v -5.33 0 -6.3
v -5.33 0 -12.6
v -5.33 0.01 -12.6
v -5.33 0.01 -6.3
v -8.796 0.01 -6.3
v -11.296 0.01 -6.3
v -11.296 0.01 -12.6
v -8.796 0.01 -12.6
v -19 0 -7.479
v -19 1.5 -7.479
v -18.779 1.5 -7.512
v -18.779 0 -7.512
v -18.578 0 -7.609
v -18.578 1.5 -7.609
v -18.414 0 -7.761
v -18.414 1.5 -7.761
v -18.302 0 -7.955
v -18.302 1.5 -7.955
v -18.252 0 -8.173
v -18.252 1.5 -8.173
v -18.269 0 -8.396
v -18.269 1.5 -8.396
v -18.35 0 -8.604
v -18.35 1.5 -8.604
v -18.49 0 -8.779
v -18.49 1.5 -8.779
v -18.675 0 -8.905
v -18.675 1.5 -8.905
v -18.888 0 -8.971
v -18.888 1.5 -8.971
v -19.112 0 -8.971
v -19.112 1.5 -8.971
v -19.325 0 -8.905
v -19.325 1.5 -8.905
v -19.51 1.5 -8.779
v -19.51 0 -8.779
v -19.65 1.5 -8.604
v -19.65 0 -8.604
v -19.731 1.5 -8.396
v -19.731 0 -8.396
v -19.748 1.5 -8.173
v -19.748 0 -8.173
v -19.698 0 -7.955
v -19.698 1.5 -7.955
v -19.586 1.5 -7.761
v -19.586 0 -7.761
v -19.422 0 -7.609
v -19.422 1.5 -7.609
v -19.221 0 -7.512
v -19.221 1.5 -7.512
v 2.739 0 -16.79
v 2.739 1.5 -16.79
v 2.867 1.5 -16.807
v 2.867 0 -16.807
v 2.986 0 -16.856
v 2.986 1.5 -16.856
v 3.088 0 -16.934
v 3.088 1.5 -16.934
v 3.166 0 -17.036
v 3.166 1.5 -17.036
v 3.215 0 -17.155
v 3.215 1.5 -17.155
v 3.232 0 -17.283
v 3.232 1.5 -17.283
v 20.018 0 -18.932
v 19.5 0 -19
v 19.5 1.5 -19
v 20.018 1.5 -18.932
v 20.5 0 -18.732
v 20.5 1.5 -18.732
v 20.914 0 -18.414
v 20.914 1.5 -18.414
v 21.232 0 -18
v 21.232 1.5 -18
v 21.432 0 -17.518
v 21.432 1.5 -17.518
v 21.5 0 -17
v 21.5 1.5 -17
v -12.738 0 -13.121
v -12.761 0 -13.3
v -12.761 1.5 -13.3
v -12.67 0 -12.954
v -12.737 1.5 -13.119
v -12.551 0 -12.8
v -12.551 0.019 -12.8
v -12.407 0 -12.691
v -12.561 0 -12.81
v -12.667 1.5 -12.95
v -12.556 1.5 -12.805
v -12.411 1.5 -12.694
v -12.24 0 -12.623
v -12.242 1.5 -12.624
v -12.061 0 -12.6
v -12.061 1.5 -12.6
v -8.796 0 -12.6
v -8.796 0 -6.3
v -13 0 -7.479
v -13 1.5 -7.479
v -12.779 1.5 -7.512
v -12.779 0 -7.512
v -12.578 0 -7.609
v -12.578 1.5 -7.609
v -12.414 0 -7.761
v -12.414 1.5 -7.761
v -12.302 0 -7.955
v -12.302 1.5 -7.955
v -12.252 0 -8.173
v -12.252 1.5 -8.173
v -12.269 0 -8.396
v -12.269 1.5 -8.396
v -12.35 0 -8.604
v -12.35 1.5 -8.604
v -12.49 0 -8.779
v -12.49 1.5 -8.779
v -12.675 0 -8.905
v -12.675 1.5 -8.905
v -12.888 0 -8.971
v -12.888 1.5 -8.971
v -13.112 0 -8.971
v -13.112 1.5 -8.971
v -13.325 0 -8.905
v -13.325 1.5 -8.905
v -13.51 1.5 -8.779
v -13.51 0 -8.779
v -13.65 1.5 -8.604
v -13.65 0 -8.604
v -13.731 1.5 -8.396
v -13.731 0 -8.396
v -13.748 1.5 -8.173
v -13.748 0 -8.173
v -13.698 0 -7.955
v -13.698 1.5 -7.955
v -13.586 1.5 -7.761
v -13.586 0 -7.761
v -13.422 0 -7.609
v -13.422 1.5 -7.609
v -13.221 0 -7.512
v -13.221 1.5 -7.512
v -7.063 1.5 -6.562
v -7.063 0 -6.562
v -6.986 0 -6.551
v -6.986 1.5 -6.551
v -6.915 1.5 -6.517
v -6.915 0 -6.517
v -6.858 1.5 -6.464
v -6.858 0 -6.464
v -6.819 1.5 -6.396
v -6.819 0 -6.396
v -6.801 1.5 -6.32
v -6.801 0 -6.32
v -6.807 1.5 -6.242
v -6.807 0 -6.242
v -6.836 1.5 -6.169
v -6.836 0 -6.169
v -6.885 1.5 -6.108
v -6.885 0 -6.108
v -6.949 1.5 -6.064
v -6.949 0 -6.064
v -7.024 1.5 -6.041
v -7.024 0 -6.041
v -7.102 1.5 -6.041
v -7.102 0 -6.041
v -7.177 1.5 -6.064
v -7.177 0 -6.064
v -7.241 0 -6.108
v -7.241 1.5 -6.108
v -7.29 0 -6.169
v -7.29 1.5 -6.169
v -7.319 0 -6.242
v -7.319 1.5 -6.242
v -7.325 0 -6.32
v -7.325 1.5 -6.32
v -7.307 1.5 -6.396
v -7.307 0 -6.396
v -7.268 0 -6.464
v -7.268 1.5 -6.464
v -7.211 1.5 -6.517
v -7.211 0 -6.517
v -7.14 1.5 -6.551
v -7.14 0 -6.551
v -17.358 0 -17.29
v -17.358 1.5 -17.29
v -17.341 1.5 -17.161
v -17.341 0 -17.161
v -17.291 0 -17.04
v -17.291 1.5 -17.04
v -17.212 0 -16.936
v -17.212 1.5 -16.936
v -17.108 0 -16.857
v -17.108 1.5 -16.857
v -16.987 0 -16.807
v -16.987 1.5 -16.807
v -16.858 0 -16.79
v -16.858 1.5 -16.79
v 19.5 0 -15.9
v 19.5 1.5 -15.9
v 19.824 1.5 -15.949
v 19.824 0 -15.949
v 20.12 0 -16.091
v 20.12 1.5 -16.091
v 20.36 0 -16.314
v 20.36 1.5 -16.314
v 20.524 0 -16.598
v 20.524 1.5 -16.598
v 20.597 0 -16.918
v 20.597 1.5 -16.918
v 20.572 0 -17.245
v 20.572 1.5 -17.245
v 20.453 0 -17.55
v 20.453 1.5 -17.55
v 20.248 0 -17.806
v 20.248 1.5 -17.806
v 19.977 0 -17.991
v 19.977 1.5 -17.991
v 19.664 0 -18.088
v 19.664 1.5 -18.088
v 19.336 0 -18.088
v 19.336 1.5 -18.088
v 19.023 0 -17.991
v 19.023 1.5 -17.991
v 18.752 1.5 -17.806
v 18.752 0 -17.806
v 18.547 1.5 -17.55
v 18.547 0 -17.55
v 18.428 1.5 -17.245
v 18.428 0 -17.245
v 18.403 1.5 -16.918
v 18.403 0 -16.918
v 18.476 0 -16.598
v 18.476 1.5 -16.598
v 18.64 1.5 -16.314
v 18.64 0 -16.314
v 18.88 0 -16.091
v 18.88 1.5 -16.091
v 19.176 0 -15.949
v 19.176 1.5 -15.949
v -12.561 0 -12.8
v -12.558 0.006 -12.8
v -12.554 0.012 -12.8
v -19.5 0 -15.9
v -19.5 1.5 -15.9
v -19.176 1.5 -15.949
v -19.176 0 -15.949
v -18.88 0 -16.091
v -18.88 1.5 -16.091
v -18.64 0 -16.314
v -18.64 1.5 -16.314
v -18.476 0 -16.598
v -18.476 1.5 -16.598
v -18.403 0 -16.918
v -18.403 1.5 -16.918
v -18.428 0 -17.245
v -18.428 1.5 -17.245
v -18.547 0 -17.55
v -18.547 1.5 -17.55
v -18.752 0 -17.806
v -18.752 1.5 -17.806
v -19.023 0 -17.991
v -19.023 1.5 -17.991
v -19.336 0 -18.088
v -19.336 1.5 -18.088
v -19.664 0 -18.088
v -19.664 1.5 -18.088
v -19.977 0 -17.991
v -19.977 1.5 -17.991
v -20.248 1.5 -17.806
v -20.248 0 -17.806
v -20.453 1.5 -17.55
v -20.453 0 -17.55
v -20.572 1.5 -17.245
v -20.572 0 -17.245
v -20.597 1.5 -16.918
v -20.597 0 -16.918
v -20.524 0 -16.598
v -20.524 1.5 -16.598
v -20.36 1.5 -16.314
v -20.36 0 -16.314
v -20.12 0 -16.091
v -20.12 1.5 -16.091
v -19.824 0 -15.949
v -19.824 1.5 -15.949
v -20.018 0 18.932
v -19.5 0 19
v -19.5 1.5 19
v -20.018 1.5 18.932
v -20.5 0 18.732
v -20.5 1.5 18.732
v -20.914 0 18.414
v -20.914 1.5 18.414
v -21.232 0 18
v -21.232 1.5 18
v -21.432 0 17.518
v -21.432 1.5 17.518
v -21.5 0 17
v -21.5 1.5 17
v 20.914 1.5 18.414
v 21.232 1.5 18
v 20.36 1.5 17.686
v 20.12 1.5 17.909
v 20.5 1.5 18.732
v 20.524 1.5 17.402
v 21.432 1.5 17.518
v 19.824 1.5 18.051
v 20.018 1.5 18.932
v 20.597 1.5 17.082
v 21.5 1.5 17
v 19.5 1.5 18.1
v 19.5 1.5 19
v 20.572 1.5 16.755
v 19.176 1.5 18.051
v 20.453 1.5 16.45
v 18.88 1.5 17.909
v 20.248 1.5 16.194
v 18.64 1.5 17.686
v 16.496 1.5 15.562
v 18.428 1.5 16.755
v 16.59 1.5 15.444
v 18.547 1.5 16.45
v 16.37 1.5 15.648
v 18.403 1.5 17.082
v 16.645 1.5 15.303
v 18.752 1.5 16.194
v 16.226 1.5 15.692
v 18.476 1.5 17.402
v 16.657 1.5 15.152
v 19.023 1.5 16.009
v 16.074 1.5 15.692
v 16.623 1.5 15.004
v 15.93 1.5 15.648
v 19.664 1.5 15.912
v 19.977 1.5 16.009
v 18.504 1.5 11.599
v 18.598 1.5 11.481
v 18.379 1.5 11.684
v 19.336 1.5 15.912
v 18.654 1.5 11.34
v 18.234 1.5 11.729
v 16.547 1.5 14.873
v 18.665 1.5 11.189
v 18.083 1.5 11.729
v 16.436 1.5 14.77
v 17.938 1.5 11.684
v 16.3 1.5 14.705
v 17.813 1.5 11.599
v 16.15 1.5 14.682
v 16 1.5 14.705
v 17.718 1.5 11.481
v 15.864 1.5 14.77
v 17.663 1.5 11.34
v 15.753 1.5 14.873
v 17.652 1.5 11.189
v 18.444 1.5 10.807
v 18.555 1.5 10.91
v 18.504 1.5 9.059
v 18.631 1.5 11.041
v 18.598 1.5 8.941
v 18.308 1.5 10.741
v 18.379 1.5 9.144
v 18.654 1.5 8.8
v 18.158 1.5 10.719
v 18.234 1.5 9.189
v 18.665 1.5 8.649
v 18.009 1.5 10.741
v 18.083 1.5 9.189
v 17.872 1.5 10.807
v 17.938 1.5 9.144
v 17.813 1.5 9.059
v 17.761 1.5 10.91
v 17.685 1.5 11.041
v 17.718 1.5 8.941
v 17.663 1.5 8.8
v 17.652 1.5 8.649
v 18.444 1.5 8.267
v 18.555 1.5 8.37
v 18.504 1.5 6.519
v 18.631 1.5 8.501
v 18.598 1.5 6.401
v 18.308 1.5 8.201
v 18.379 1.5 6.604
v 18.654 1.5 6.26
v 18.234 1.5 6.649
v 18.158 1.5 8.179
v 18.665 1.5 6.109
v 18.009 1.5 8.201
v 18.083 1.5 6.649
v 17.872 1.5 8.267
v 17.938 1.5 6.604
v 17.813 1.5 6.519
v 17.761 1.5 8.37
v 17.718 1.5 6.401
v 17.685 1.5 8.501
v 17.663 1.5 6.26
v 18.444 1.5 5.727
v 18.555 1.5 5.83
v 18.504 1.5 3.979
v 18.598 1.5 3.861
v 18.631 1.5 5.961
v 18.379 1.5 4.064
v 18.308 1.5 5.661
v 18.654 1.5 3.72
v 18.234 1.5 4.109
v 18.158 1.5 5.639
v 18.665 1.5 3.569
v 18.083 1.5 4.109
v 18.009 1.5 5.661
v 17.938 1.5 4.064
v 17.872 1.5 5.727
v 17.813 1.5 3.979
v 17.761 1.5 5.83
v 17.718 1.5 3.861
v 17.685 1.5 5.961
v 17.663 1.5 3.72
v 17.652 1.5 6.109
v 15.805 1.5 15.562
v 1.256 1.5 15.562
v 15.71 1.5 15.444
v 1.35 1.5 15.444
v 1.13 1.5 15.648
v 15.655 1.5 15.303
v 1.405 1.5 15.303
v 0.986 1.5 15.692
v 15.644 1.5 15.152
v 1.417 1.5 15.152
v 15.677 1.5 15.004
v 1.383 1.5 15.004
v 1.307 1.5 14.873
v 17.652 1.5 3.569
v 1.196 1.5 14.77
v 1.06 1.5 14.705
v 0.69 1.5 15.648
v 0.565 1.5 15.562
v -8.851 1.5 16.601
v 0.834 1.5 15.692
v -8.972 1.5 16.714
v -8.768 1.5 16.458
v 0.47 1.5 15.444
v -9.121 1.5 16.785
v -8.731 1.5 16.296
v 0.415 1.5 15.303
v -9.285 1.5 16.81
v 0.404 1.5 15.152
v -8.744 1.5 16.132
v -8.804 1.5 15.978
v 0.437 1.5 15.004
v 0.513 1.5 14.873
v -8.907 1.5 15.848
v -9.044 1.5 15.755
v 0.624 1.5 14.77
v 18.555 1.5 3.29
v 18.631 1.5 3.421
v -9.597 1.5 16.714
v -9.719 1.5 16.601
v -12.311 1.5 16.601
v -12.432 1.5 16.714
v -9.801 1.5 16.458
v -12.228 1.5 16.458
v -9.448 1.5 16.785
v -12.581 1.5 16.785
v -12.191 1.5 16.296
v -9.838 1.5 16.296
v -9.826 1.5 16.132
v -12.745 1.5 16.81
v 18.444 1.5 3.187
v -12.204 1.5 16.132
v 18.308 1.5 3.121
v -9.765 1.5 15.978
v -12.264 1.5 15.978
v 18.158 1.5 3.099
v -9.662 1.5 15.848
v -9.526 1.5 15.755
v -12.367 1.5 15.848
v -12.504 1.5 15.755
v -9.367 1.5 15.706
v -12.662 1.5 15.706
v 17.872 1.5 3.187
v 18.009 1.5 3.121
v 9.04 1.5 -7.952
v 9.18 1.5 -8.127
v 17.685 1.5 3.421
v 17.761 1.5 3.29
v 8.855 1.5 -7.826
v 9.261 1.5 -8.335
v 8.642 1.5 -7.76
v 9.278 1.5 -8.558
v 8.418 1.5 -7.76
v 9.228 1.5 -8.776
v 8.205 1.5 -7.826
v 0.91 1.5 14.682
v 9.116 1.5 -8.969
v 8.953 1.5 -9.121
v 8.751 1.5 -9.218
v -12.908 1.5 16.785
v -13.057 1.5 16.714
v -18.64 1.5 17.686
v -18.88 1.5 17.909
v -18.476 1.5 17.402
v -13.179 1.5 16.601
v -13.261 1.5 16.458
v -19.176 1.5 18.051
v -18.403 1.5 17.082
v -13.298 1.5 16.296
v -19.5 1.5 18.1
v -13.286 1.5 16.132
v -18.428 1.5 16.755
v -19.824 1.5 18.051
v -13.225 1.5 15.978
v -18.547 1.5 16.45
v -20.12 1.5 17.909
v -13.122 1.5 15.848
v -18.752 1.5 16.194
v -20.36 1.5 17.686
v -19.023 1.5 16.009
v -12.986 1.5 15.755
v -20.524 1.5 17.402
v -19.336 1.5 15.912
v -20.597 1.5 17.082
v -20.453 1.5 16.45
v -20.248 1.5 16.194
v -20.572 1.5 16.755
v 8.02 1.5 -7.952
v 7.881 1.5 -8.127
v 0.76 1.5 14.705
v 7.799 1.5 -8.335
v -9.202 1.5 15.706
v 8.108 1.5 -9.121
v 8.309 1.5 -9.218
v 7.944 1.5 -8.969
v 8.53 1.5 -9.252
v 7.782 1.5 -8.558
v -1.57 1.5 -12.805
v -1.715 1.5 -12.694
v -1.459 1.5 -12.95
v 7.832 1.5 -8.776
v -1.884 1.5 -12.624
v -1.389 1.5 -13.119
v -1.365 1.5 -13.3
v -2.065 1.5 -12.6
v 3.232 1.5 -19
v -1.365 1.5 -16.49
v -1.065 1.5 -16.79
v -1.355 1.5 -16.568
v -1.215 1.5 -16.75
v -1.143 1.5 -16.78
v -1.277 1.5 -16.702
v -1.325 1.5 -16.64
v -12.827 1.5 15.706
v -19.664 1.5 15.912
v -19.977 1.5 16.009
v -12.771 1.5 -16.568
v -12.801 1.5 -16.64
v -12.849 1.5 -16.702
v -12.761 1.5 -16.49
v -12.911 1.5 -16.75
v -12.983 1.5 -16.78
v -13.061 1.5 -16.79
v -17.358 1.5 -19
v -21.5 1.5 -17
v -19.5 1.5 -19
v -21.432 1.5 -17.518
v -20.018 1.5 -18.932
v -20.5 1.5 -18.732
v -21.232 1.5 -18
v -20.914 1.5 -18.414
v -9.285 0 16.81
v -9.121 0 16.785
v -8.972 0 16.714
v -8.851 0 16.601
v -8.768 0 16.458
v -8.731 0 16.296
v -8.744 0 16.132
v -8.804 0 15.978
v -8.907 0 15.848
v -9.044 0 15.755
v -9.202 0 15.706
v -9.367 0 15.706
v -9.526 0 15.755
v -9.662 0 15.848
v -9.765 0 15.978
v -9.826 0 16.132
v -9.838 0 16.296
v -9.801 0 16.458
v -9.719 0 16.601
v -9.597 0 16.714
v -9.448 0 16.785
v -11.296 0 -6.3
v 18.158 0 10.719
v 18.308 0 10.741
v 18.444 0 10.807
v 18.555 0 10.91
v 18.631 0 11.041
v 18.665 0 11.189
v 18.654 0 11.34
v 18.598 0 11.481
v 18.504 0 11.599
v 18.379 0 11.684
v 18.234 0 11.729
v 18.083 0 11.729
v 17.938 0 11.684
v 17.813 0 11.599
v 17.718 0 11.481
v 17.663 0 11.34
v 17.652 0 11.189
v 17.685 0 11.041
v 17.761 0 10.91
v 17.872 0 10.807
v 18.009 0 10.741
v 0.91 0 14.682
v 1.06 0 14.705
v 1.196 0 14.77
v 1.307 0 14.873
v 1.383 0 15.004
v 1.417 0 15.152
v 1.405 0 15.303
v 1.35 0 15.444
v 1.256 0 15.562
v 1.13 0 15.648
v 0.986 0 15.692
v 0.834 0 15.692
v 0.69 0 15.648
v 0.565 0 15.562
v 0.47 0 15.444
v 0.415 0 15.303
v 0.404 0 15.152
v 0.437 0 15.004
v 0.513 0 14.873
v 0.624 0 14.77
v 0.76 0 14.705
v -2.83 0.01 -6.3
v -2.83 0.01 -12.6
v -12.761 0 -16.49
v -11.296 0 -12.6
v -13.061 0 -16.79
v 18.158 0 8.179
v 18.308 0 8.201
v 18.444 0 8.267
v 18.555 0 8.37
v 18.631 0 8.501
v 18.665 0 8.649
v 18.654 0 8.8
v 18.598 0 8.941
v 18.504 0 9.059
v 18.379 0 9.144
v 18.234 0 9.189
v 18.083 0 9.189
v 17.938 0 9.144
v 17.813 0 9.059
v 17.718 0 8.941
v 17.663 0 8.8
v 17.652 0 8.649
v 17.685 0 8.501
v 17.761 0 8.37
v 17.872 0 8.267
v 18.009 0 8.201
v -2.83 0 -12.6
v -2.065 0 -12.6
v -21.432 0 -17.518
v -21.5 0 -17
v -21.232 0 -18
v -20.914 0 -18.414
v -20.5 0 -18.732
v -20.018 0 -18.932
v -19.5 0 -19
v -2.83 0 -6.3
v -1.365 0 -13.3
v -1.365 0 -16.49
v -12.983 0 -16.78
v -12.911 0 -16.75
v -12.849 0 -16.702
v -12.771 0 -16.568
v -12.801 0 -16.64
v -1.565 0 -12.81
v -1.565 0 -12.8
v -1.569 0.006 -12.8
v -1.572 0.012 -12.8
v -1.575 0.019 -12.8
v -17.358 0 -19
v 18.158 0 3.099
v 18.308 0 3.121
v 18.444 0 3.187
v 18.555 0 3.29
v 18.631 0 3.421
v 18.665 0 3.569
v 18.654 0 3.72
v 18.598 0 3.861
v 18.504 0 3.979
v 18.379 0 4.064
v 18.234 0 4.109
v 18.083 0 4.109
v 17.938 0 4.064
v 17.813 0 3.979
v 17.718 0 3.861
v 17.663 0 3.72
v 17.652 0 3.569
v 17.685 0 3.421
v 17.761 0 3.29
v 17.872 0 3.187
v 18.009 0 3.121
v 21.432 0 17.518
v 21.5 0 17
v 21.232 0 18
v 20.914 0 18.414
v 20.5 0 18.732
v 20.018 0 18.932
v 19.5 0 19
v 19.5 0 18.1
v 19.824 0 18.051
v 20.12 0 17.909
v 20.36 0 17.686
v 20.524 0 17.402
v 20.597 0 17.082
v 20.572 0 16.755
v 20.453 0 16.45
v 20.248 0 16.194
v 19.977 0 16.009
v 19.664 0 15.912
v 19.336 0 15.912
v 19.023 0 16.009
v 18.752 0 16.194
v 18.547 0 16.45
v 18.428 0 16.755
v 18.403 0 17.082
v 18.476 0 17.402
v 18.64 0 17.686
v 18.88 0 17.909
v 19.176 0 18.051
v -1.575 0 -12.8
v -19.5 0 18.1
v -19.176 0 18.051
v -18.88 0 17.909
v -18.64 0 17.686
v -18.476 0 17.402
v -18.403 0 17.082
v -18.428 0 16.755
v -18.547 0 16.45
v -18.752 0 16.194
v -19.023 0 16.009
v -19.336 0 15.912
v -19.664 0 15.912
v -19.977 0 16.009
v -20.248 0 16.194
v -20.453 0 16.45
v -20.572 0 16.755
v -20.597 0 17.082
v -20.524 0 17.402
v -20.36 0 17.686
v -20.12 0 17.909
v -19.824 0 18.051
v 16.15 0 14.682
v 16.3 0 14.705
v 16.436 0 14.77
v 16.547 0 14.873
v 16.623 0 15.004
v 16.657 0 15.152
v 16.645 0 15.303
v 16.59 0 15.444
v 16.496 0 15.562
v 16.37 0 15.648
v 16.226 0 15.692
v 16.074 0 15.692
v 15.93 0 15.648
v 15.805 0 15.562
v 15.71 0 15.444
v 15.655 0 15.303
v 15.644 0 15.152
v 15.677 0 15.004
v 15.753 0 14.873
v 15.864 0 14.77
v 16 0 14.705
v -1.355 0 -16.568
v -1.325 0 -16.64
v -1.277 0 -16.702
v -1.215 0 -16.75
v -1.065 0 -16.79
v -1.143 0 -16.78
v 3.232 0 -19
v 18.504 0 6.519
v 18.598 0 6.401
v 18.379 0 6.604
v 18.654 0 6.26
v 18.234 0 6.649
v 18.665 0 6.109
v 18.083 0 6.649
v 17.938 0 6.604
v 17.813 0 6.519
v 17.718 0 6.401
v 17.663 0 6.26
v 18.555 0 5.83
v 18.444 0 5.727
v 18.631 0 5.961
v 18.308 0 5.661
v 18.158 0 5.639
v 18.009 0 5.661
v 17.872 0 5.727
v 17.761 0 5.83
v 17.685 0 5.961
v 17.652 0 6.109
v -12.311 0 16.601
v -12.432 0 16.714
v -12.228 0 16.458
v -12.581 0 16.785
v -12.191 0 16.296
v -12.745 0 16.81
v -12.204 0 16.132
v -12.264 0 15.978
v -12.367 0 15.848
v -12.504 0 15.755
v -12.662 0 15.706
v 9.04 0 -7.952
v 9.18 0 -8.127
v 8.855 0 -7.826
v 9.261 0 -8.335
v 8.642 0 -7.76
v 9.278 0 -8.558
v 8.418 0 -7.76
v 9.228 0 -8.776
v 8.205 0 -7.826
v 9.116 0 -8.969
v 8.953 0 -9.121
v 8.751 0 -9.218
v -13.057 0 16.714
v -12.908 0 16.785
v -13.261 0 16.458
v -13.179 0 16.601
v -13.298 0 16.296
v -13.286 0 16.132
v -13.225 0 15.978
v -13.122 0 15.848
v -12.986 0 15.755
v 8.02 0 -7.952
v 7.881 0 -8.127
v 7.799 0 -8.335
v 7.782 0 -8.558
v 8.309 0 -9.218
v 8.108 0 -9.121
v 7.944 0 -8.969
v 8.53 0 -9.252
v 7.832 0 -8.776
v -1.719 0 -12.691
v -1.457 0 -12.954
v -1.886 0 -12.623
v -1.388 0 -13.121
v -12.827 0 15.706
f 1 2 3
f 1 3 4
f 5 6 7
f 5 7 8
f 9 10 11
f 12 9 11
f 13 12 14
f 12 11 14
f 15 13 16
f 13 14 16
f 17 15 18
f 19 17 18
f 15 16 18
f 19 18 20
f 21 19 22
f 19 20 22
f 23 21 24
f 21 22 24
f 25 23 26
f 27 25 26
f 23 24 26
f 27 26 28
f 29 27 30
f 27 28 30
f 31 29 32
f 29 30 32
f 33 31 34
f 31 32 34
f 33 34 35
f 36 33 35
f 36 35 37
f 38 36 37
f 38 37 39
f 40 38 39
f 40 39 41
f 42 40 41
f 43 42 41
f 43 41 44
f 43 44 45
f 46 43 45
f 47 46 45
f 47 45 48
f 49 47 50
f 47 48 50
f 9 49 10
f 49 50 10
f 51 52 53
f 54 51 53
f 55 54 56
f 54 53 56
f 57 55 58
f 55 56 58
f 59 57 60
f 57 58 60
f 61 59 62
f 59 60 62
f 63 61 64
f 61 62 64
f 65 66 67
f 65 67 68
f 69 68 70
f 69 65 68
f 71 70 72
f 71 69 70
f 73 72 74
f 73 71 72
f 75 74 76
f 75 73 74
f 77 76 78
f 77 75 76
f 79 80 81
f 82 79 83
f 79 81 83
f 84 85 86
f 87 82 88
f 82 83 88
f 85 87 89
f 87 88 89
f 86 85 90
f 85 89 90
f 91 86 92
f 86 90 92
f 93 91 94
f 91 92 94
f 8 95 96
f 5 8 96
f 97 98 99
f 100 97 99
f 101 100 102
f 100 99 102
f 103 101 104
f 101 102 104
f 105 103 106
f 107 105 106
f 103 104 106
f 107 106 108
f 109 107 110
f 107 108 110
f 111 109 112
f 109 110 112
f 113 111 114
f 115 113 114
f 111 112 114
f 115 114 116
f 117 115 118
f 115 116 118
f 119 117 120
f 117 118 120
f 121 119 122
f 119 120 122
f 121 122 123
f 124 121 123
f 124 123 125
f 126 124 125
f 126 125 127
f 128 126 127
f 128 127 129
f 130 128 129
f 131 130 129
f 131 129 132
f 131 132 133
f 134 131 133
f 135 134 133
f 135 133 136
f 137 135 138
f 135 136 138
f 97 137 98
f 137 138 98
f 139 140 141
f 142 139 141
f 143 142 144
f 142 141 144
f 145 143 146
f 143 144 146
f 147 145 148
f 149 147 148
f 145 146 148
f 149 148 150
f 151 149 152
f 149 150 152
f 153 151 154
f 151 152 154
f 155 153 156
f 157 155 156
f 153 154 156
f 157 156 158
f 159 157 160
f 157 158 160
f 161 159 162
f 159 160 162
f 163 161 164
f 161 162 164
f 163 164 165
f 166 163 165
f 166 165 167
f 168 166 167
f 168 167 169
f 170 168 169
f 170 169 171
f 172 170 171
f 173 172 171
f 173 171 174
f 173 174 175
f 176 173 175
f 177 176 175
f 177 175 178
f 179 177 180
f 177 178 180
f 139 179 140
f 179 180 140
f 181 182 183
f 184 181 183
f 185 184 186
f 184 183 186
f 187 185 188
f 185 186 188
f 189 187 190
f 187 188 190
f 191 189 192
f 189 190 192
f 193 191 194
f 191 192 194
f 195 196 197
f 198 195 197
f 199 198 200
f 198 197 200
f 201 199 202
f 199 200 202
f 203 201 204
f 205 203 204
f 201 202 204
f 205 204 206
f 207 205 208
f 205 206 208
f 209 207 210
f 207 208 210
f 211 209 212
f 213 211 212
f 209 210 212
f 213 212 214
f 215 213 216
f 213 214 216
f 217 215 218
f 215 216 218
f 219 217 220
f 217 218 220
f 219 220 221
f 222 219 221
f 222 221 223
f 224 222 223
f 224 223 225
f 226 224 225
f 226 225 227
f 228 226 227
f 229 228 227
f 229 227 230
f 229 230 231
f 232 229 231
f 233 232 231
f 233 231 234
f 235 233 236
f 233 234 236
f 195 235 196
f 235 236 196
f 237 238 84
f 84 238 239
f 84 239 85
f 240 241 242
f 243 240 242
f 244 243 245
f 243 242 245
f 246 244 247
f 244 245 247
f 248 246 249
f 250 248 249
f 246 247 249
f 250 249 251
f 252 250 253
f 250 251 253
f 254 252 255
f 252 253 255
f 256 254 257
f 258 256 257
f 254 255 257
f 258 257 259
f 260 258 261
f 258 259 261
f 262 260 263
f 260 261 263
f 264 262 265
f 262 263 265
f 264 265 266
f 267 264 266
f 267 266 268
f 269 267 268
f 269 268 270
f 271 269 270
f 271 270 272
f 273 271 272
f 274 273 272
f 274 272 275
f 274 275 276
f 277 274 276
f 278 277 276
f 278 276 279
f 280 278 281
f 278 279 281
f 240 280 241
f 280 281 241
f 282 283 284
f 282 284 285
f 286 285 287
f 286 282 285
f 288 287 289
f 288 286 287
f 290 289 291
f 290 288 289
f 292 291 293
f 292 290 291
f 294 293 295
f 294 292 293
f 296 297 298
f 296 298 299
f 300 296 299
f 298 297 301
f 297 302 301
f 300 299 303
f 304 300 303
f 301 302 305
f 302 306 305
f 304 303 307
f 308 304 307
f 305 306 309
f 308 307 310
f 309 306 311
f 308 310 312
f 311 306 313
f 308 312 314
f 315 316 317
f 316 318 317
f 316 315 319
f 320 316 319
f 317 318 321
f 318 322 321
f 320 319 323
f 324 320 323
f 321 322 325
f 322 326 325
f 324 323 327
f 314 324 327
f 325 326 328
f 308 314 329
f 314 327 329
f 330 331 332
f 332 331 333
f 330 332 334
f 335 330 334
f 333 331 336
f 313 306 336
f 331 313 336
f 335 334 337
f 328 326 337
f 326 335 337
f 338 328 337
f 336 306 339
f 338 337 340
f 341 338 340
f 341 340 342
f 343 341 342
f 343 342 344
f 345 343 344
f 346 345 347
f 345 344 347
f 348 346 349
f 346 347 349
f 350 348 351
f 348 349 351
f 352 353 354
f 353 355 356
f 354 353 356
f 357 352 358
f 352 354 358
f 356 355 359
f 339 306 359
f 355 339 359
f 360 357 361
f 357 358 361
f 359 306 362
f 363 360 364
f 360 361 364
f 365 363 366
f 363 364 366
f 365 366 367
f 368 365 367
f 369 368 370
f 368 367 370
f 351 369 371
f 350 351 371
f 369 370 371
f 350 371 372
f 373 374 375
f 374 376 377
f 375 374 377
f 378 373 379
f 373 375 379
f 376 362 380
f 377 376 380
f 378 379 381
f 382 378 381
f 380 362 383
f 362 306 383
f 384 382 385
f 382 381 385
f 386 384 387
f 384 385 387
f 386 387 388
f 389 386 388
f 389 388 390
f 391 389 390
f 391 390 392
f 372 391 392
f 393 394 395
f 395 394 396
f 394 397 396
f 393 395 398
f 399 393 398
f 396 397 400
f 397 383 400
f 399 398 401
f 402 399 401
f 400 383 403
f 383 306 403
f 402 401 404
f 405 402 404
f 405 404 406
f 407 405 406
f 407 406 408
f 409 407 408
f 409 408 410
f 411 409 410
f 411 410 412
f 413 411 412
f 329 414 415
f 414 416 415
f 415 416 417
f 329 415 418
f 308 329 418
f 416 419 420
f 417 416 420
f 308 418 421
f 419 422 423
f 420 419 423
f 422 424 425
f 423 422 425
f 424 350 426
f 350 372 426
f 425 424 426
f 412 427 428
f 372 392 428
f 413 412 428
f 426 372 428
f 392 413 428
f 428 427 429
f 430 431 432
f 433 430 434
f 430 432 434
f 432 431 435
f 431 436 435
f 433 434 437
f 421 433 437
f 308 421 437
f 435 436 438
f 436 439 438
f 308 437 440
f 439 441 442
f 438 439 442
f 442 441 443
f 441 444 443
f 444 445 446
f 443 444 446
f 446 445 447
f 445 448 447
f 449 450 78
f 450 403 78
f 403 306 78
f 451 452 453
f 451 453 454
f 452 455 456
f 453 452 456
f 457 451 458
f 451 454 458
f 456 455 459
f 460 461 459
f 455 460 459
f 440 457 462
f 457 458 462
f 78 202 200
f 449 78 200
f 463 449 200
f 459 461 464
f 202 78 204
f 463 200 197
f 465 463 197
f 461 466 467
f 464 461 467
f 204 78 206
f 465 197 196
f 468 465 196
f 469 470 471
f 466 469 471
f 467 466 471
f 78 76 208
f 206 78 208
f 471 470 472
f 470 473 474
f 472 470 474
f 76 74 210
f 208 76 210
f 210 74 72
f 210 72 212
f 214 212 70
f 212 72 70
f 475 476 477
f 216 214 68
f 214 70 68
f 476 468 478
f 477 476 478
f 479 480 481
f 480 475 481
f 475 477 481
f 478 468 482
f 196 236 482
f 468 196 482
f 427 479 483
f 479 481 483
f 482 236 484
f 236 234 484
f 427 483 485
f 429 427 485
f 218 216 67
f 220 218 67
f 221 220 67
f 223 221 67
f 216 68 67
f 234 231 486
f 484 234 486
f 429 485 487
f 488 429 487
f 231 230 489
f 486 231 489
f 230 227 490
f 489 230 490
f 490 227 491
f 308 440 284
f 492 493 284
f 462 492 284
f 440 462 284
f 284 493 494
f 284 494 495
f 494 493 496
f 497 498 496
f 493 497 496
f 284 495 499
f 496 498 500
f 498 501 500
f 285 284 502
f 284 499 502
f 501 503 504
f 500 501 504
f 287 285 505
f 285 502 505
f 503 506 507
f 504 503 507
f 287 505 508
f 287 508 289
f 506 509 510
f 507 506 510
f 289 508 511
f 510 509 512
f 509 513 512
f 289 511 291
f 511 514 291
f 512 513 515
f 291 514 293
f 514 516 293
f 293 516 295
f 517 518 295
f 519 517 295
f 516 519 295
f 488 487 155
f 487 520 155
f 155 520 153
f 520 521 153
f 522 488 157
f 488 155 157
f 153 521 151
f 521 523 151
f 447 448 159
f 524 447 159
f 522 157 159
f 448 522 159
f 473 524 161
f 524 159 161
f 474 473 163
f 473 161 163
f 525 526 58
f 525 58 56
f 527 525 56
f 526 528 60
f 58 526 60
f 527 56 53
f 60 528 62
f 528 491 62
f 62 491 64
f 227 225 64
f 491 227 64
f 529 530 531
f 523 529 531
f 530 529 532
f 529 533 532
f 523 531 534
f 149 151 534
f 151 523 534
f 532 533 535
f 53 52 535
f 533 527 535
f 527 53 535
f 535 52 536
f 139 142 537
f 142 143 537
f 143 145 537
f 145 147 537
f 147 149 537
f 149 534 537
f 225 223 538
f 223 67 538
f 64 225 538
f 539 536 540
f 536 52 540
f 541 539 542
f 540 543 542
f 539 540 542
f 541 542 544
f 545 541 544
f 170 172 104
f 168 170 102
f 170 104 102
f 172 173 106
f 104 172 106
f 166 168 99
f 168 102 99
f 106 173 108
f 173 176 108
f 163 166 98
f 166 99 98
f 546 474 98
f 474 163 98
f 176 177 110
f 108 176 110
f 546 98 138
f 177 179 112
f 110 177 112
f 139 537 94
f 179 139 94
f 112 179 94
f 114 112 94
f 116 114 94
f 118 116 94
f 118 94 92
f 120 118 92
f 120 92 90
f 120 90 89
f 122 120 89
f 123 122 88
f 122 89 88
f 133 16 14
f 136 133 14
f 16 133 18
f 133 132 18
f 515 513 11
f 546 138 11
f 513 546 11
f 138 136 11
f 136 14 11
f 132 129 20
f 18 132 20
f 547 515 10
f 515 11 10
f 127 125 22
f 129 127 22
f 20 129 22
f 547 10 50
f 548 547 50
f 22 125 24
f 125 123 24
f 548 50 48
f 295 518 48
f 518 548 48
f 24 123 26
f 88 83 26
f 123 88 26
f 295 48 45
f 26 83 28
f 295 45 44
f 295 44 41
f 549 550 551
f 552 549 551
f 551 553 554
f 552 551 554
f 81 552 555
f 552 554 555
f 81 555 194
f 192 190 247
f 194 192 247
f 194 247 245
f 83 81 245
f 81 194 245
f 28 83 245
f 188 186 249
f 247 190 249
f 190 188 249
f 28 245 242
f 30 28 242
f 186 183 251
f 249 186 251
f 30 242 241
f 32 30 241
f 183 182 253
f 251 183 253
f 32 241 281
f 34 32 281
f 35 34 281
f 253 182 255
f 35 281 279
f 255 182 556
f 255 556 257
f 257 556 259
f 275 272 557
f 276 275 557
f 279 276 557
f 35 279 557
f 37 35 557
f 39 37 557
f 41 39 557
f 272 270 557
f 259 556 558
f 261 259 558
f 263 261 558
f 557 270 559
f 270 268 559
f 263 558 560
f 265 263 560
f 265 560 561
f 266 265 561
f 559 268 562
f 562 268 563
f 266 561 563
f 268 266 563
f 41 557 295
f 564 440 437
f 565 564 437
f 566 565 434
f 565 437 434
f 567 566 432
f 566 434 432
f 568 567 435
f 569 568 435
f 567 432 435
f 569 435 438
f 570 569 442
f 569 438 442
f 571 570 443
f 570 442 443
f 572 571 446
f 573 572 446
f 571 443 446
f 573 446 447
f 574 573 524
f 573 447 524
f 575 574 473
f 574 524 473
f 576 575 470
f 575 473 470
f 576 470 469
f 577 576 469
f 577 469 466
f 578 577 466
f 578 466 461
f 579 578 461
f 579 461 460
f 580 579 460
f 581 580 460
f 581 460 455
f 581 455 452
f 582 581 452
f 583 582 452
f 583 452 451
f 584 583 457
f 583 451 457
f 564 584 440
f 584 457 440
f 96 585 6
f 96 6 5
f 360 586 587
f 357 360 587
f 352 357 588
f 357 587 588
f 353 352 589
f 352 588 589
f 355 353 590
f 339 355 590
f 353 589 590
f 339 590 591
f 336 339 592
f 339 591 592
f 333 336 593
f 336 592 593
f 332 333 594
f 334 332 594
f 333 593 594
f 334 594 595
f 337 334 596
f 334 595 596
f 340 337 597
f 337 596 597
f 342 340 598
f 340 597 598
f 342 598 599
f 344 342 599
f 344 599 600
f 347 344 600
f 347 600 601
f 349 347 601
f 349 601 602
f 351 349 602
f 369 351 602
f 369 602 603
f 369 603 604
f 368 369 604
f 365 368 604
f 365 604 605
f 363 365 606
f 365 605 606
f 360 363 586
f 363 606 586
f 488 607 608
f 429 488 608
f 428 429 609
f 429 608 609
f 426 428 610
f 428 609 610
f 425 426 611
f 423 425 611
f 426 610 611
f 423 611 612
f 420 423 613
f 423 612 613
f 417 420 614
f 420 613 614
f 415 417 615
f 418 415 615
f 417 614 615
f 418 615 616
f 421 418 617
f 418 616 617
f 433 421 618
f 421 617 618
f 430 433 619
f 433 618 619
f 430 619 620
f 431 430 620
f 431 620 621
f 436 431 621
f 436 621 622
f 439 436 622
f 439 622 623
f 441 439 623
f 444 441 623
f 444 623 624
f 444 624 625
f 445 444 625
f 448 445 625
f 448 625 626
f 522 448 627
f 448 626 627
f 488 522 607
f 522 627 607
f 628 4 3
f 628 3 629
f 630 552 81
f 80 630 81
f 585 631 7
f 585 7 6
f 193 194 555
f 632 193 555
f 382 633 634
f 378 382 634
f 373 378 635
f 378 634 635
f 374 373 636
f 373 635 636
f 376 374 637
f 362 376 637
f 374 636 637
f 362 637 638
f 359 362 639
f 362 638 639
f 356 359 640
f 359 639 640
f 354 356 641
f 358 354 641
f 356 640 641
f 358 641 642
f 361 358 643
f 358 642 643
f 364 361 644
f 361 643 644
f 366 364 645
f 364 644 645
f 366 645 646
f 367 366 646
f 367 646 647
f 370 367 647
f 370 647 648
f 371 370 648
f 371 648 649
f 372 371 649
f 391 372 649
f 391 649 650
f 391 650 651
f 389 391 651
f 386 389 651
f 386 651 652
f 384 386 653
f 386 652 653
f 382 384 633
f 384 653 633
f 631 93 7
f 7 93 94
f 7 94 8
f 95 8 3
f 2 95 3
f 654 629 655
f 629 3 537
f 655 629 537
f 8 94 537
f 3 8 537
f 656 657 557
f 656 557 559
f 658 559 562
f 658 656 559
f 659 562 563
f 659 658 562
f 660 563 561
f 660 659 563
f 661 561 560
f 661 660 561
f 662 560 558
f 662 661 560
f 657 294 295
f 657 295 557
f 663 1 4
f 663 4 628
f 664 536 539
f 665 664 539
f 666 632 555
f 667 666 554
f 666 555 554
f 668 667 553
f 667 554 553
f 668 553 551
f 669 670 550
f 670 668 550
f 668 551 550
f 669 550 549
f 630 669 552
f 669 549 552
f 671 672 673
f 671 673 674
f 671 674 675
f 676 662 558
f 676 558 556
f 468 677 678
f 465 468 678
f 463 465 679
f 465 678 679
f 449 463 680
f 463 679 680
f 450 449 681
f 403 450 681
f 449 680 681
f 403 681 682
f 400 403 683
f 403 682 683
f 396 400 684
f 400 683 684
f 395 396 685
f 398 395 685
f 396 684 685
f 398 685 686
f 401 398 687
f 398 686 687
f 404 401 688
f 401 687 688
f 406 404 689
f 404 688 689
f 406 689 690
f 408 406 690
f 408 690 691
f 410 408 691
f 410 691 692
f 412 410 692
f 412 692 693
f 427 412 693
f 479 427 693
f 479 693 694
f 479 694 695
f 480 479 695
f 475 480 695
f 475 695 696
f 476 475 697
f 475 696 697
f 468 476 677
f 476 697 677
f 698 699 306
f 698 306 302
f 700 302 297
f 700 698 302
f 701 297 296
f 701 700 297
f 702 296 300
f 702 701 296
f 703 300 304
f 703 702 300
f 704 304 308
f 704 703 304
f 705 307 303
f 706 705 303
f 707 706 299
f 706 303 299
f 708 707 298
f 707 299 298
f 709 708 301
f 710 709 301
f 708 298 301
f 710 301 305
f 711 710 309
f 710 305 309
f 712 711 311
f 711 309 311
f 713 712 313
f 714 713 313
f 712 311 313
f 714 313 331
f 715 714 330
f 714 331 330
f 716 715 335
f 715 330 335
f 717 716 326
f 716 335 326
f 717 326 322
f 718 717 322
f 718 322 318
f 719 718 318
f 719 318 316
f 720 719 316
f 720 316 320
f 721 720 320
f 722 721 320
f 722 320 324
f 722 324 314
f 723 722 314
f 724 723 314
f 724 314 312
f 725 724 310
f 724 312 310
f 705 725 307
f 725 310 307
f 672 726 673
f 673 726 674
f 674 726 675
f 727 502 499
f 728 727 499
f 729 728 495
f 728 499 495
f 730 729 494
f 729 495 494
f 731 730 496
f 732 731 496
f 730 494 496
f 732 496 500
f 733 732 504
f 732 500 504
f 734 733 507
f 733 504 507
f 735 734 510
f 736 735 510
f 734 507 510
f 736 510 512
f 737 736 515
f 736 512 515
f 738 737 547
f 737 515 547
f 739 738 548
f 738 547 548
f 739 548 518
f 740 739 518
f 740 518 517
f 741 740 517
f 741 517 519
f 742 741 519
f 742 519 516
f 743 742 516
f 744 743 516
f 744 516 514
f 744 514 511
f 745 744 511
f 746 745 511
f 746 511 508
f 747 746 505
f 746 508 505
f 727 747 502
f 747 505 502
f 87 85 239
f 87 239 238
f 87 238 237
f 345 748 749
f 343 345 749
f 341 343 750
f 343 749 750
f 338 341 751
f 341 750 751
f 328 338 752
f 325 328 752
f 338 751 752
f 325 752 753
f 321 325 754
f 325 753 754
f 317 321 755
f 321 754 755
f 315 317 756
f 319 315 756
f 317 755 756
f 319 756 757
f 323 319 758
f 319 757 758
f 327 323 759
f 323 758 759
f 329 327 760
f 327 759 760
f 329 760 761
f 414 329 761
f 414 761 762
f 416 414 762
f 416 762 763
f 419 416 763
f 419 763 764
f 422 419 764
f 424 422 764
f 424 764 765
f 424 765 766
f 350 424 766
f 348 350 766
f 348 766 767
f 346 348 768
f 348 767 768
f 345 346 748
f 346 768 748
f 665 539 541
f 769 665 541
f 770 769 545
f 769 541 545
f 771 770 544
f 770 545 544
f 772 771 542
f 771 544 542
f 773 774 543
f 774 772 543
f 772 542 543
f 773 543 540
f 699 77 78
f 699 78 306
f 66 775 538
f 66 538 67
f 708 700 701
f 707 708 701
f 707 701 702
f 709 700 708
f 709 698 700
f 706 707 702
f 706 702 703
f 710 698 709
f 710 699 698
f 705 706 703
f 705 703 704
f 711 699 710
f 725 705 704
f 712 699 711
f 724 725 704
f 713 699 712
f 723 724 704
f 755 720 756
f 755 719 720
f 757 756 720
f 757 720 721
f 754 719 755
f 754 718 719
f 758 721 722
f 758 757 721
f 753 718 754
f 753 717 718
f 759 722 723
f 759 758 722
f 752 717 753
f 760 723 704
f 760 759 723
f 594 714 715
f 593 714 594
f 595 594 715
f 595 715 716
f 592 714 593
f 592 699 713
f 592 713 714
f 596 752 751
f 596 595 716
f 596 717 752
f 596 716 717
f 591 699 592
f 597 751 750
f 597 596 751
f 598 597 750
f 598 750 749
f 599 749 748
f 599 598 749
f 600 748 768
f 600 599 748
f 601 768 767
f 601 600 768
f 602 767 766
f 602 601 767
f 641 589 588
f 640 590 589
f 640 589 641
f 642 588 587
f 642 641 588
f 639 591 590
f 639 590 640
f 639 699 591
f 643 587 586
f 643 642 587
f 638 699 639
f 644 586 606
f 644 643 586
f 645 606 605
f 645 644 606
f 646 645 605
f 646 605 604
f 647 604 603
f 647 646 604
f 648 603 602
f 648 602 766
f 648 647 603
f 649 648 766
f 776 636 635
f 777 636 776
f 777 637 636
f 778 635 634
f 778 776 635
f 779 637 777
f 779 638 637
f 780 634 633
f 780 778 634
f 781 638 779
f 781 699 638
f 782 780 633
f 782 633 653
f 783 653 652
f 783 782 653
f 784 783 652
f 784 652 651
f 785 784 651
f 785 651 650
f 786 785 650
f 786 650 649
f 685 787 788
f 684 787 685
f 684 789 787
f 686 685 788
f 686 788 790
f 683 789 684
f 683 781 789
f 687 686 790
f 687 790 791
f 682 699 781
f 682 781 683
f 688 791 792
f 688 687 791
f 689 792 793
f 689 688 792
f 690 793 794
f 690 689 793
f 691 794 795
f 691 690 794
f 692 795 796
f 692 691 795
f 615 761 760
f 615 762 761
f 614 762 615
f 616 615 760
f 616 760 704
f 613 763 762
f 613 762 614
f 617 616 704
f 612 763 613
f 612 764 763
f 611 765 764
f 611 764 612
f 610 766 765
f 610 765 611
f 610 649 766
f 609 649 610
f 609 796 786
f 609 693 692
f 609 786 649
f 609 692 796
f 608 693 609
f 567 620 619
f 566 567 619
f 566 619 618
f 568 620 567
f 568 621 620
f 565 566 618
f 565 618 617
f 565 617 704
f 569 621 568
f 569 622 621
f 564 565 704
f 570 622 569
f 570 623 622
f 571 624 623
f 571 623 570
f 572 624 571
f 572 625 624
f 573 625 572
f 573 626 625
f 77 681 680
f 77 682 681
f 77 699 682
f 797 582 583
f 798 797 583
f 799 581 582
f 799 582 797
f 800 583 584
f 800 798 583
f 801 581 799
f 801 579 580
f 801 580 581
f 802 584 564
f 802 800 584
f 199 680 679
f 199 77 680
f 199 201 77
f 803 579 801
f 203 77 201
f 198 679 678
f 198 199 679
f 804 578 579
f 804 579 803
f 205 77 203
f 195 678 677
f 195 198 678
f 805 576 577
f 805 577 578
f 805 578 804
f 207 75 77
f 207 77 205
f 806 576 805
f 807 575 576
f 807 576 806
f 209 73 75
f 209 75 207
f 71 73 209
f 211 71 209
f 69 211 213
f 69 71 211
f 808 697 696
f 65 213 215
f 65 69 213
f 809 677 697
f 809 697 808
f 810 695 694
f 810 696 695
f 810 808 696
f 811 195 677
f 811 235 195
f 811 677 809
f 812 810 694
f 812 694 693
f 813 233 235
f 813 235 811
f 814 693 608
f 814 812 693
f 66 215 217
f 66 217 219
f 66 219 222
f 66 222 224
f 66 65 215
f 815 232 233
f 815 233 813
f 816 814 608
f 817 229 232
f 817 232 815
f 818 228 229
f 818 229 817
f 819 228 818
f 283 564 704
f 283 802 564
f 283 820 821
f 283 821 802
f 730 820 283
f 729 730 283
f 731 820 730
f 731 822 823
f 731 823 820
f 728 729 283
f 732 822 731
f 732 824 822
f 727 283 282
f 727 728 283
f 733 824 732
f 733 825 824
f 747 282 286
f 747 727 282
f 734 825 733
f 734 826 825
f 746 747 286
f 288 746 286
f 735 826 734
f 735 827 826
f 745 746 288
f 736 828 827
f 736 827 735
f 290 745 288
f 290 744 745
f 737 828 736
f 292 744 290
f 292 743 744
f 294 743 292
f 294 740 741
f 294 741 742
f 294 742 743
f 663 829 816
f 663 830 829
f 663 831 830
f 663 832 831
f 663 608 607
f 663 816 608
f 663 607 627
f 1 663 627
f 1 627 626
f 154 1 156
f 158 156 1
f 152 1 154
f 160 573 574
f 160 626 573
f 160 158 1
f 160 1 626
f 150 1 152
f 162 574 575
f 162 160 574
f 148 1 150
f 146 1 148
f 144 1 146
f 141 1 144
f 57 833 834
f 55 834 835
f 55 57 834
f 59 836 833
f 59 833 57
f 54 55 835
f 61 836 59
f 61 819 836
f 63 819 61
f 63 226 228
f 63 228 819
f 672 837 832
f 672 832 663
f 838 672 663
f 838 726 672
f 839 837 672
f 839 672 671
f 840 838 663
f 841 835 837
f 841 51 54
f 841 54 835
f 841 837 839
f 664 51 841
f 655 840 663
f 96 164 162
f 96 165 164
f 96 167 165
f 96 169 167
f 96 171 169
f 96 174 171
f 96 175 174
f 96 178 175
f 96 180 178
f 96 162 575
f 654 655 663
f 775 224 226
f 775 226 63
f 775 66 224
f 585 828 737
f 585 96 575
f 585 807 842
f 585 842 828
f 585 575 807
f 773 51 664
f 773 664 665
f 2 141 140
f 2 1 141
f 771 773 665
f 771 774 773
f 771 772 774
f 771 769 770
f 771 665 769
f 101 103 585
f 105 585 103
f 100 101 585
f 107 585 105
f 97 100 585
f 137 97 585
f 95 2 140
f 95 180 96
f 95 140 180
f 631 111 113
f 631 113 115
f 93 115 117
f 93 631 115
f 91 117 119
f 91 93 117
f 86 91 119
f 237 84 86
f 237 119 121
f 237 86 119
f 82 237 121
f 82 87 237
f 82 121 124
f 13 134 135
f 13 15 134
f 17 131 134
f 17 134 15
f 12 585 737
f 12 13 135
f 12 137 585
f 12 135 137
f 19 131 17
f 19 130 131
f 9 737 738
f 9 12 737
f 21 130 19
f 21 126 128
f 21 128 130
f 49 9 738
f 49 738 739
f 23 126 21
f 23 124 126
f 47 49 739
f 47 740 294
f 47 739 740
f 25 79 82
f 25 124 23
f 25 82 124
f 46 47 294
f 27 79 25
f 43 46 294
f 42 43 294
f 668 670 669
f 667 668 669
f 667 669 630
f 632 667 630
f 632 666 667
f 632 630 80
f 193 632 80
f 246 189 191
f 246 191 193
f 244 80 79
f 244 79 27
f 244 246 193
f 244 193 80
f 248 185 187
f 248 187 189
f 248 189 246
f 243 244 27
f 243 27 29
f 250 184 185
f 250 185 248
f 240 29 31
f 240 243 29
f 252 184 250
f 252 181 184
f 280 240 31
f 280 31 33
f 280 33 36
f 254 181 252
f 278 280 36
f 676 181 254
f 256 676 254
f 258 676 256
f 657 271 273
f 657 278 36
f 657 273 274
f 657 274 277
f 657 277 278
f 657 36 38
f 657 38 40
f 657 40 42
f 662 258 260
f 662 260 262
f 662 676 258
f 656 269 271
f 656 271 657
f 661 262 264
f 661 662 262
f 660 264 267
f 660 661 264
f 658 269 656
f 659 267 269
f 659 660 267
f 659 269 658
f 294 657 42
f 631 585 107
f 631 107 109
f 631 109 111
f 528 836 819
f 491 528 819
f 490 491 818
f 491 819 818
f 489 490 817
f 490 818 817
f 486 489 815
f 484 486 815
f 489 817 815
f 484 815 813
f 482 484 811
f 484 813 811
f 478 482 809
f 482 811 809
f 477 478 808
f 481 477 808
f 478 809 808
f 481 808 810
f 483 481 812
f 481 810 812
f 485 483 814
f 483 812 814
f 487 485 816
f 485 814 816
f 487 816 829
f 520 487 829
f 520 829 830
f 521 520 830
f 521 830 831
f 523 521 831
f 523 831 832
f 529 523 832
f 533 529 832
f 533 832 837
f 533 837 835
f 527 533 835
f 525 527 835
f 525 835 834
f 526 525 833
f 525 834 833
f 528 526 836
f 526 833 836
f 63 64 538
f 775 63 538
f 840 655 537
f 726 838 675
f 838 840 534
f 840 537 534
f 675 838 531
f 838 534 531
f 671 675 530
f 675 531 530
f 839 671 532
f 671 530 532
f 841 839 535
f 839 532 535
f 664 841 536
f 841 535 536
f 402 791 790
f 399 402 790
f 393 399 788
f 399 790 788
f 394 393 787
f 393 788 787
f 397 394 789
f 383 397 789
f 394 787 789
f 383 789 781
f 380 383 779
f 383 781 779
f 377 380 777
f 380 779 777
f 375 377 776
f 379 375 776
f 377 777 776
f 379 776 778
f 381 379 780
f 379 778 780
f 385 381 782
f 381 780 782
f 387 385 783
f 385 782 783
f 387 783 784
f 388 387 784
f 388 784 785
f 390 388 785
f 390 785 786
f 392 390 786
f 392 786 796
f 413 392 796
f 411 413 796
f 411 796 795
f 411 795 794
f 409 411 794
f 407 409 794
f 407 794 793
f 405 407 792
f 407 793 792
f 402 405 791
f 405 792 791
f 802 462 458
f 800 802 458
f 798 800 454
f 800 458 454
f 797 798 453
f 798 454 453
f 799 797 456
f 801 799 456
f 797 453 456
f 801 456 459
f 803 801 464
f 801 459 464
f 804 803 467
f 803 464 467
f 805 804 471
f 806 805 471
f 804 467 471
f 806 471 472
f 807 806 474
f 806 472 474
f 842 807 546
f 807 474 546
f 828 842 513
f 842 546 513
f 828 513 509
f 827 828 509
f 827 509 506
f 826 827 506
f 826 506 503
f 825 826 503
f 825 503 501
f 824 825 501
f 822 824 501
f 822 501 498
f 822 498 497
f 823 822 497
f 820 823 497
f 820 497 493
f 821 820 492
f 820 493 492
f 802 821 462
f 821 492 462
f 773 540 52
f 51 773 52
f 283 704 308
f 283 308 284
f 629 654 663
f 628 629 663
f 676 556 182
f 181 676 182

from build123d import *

# Parameters (mm, degrees)
BOSS_EXTRUDE1_DEPTH = 1.5
CAVITY1_START       = -19
CAVITY1_DEPTH       = 6.2
CAVITY1_2_DEPTH     = 2.01
CUT_EXTRUDE3_REACH  = 30.732
SKETCH5_R           = 1.1
CUT_EXTRUDE6_DEPTH  = 1.5
SKETCH6_W           = 2.5
SKETCH6_H           = 6.3
CUT_EXTRUDE7_DEPTH  = 0.01
SKETCH7_R           = 0.75
CUT_EXTRUDE8_DEPTH  = 1.5
SKETCH8_OUTSIDE_W   = 56.48
SKETCH8_OUTSIDE_H   = 51.48
SKETCH8_OUTSIDE_R   = 0.555
CUT_EXTRUDE9_DEPTH  = 1.5
SKETCH9_R           = 0.75
SKETCH9_R_2         = 0.508
SKETCH9_R_3         = 0.262351118
CUT_EXTRUDE10_DEPTH = 1.5


# Read off the part's stored shape, not the designer's step: Cavity1
with BuildPart() as part:
    # Sketch1 → Boss-Extrude1 (new body)
    with BuildSketch(Plane(origin=(0, 0, 0), x_dir=(1, 0, 0), z_dir=(0, 1, 0))):
        with BuildLine():
            Line((-19.5, 19), (19.5, 19))
            ThreePointArc((19.5, 19), (20.914213562, 18.414213562), (21.5, 17))
            Line((21.5, 17), (21.5, -17))
            ThreePointArc((21.5, -17), (20.914213562, -18.414213562), (19.5, -19))
            Line((19.5, -19), (-19.5, -19))
            ThreePointArc((-19.5, -19), (-20.914213562, -18.414213562), (-21.5, -17))
            Line((-21.5, -17), (-21.5, 17))
            ThreePointArc((-21.5, 17), (-20.914213562, 18.414213562), (-19.5, 19))
        make_face()
    extrude(amount=BOSS_EXTRUDE1_DEPTH)

    # Cavity1 outline → Cavity1 (cut)
    with BuildSketch(Plane.XY.offset(CAVITY1_START)):
        with BuildLine():
            ThreePointArc((-11.428721681, 1.5), (-12.051521733, 0.792798554), (-12.560917691, 0))
            Line((-12.560917691, 0), (-1.565146914, 0))
            ThreePointArc((-1.565146914, 0), (-2.074542872, 0.792798554), (-2.697342924, 1.5))
            Line((-2.697342924, 1.5), (-11.428721681, 1.5))
        make_face()
    extrude(amount=CAVITY1_DEPTH, mode=Mode.SUBTRACT)

    # Cavity1 2 outline → Cavity1 2 (cut)
    with BuildSketch(Plane.XY.offset(CAVITY1_START)):
        with BuildLine():
            Line((-17.158032303, 1.5), (-17.158032303, 0))
            Line((-17.158032303, 0), (-12.560917691, 0))
            ThreePointArc((-12.560917691, 0), (-12.051521733, 0.792798554), (-11.428721681, 1.5))
            Line((-11.428721681, 1.5), (-17.158032303, 1.5))
        make_face()
        with BuildLine():
            ThreePointArc((-2.697342924, 1.5), (-2.074542872, 0.792798554), (-1.565146914, 0))
            Line((-1.565146914, 0), (3.031967697, 0))
            Line((3.031967697, 0), (3.031967697, 1.5))
            Line((3.031967697, 1.5), (-2.697342924, 1.5))
        make_face()
    extrude(amount=CAVITY1_2_DEPTH, mode=Mode.SUBTRACT)

    # Cut-Extrude3: up to this face of the body (flat: up to its plane)
    cut_extrude3_end = Plane(part.part.faces().sort_by_distance((0.396422331, 0, 0.917486048))[0])
    # Sketch4 → Cut-Extrude3 (cut, up to the picked face)
    with BuildSketch(Plane(origin=(0, 1.5, 0), x_dir=(1, 0, 0), z_dir=(0, 1, 0)), mode=Mode.PRIVATE) as cut_extrude3_sk1:
        with BuildLine():
            Line((-16.858032303, 16.79), (-13.060917691, 16.79))
            ThreePointArc((-13.060917691, 16.79), (-12.848785657, 16.702132034), (-12.760917691, 16.49))
            Line((-12.760917691, 16.49), (-12.760917691, 13.3))
            ThreePointArc((-12.760917691, 13.3), (-12.555892438, 12.805025253), (-12.060917691, 12.6))
            Line((-12.060917691, 12.6), (-2.065146914, 12.6))
            ThreePointArc((-2.065146914, 12.6), (-1.570172167, 12.805025253), (-1.365146914, 13.3))
            Line((-1.365146914, 13.3), (-1.365146914, 16.49))
            ThreePointArc((-1.365146914, 16.49), (-1.277278948, 16.702132034), (-1.065146914, 16.79))
            Line((-1.065146914, 16.79), (2.739051684, 16.79))
            ThreePointArc((2.739051684, 16.79), (3.08759594, 16.934371758), (3.231967697, 17.282916013))
            Line((3.231967697, 17.282916013), (3.231967697, 19.2))
            Line((3.231967697, 19.2), (-17.358032303, 19.2))
            Line((-17.358032303, 19.2), (-17.358032303, 17.29))
            ThreePointArc((-17.358032303, 17.29), (-17.211585693, 16.936446609), (-16.858032303, 16.79))
        make_face()
    cut_extrude3_tool1 = split(extrude(cut_extrude3_sk1.sketch, amount=-CUT_EXTRUDE3_REACH, mode=Mode.PRIVATE), bisect_by=cut_extrude3_end, keep=Keep.BOTH, mode=Mode.PRIVATE)
    add(cut_extrude3_tool1.solids().sort_by(Axis((-7.062875, 1.5, -16.384158), (0, -1, 0)))[0], mode=Mode.SUBTRACT)

    # Sketch5 → Cut-Extrude6 (cut)
    with BuildSketch(Plane(origin=(0, 1.5, 0), x_dir=(1, 0, 0), z_dir=(0, 1, 0))):
        with Locations(Location((19.5, 17, 0), (0, 0, 270))):
            Circle(SKETCH5_R)
        with Locations(Location((19.5, -17, 0), (0, 0, 270))):
            Circle(SKETCH5_R)
        with Locations(Location((-19.5, 17, 0), (0, 0, 270))):
            Circle(SKETCH5_R)
        with Locations(Location((-19.5, -17, 0), (0, 0, 270))):
            Circle(SKETCH5_R)
    extrude(amount=-CUT_EXTRUDE6_DEPTH, mode=Mode.SUBTRACT)

    # Sketch6 → Cut-Extrude7 (cut)
    with BuildSketch(Plane.XZ):
        with Locations((-10.046489819, -9.45)):
            Rectangle(SKETCH6_W, SKETCH6_H)
        with Locations((-4.079574786, -9.45)):
            Rectangle(SKETCH6_W, SKETCH6_H)
    extrude(amount=-CUT_EXTRUDE7_DEPTH, mode=Mode.SUBTRACT)

    # Sketch7 → Cut-Extrude8 (cut)
    with BuildSketch(Plane(origin=(0, 1.5, 0), x_dir=(1, 0, 0), z_dir=(0, 1, 0))):
        with Locations(Location((-13, 8.22889094, 0), (0, 0, 270))):
            Circle(SKETCH7_R)
        with Locations(Location((-19, 8.22889094, 0), (0, 0, 270))):
            Circle(SKETCH7_R)
    extrude(amount=-CUT_EXTRUDE8_DEPTH, mode=Mode.SUBTRACT)

    # Sketch8 outside → Cut-Extrude9 (cut)
    # profile 1 of 3: a face of its own
    with BuildSketch(Plane(origin=(0, 1.5, 0), x_dir=(1, 0, 0), z_dir=(0, 1, 0))):
        Rectangle(SKETCH8_OUTSIDE_W, SKETCH8_OUTSIDE_H)
        with BuildLine():
            Line((-17.358032303, 17.29), (-17.358032303, 19))
            Line((-17.358032303, 19), (-19.5, 19))
            ThreePointArc((-19.5, 19), (-20.914213562, 18.414213562), (-21.5, 17))
            Line((-21.5, 17), (-21.5, -17))
            ThreePointArc((-21.5, -17), (-20.914213562, -18.414213562), (-19.5, -19))
            Line((-19.5, -19), (19.5, -19))
            ThreePointArc((19.5, -19), (20.914213562, -18.414213562), (21.5, -17))
            Line((21.5, -17), (21.5, 17))
            ThreePointArc((21.5, 17), (20.914213562, 18.414213562), (19.5, 19))
            Line((19.5, 19), (3.231967697, 19))
            Line((3.231967697, 19), (3.231967697, 17.282916013))
            ThreePointArc((3.231967697, 17.282916013), (3.08759594, 16.934371758), (2.739051684, 16.79))
            Line((2.739051684, 16.79), (-1.065146914, 16.79))
            ThreePointArc((-1.065146914, 16.79), (-1.277278948, 16.702132034), (-1.365146914, 16.49))
            Line((-1.365146914, 16.49), (-1.365146914, 13.3))
            ThreePointArc((-1.365146914, 13.3), (-1.570172167, 12.805025253), (-2.065146914, 12.6))
            Line((-2.065146914, 12.6), (-12.060917691, 12.6))
            ThreePointArc((-12.060917691, 12.6), (-12.555892438, 12.805025253), (-12.760917691, 13.3))
            Line((-12.760917691, 13.3), (-12.760917691, 16.49))
            ThreePointArc((-12.760917691, 16.49), (-12.848785657, 16.702132034), (-13.060917691, 16.79))
            Line((-13.060917691, 16.79), (-16.858032303, 16.79))
            ThreePointArc((-16.858032303, 16.79), (-17.211585693, 16.936446609), (-17.358032303, 17.29))
        make_face(mode=Mode.SUBTRACT)
    # profile 2 of 3: a face of its own
    with BuildSketch(Plane(origin=(0, 1.5, 0), x_dir=(1, 0, 0), z_dir=(0, 1, 0))):
        with Locations(Location((-12.744728974, -16.255, 0), (0, 0, 270))):
            Circle(SKETCH8_OUTSIDE_R)
    # profile 3 of 3: a face of its own
    with BuildSketch(Plane(origin=(0, 1.5, 0), x_dir=(1, 0, 0), z_dir=(0, 1, 0))):
        with Locations(Location((-9.284728974, -16.255, 0), (0, 0, 270))):
            Circle(SKETCH8_OUTSIDE_R)
    extrude(amount=-CUT_EXTRUDE9_DEPTH, mode=Mode.SUBTRACT)

    # Sketch9 → Cut-Extrude10 (cut)
    with BuildSketch(Plane.XZ):
        with Locations(Location((8.53007963, -8.501636461, 0), (0, 0, 270))):
            Circle(SKETCH9_R)
        with Locations(Location((18.158240781, 11.226709095, 0), (0, 0, 270))):
            Circle(SKETCH9_R_2)
        with Locations(Location((18.158240781, 8.686709095, 0), (0, 0, 270))):
            Circle(SKETCH9_R_2)
        with Locations(Location((18.158240781, 6.146709095, 0), (0, 0, 270))):
            Circle(SKETCH9_R_2)
        with Locations(Location((18.158240781, 3.606709095, 0), (0, 0, 270))):
            Circle(SKETCH9_R_2)
        with Locations(Location((16.15007963, 15.19, 0), (0, 0, 270))):
            Circle(SKETCH9_R_2)
        with Locations(Location((-7.063032303, -6.3, 0), (0, 0, 270))):
            Circle(SKETCH9_R_3)
        with Locations(Location((0.91007963, 15.19, 0), (0, 0, 270))):
            Circle(SKETCH9_R_2)
    extrude(amount=-CUT_EXTRUDE10_DEPTH, mode=Mode.SUBTRACT)


solid = part.part
